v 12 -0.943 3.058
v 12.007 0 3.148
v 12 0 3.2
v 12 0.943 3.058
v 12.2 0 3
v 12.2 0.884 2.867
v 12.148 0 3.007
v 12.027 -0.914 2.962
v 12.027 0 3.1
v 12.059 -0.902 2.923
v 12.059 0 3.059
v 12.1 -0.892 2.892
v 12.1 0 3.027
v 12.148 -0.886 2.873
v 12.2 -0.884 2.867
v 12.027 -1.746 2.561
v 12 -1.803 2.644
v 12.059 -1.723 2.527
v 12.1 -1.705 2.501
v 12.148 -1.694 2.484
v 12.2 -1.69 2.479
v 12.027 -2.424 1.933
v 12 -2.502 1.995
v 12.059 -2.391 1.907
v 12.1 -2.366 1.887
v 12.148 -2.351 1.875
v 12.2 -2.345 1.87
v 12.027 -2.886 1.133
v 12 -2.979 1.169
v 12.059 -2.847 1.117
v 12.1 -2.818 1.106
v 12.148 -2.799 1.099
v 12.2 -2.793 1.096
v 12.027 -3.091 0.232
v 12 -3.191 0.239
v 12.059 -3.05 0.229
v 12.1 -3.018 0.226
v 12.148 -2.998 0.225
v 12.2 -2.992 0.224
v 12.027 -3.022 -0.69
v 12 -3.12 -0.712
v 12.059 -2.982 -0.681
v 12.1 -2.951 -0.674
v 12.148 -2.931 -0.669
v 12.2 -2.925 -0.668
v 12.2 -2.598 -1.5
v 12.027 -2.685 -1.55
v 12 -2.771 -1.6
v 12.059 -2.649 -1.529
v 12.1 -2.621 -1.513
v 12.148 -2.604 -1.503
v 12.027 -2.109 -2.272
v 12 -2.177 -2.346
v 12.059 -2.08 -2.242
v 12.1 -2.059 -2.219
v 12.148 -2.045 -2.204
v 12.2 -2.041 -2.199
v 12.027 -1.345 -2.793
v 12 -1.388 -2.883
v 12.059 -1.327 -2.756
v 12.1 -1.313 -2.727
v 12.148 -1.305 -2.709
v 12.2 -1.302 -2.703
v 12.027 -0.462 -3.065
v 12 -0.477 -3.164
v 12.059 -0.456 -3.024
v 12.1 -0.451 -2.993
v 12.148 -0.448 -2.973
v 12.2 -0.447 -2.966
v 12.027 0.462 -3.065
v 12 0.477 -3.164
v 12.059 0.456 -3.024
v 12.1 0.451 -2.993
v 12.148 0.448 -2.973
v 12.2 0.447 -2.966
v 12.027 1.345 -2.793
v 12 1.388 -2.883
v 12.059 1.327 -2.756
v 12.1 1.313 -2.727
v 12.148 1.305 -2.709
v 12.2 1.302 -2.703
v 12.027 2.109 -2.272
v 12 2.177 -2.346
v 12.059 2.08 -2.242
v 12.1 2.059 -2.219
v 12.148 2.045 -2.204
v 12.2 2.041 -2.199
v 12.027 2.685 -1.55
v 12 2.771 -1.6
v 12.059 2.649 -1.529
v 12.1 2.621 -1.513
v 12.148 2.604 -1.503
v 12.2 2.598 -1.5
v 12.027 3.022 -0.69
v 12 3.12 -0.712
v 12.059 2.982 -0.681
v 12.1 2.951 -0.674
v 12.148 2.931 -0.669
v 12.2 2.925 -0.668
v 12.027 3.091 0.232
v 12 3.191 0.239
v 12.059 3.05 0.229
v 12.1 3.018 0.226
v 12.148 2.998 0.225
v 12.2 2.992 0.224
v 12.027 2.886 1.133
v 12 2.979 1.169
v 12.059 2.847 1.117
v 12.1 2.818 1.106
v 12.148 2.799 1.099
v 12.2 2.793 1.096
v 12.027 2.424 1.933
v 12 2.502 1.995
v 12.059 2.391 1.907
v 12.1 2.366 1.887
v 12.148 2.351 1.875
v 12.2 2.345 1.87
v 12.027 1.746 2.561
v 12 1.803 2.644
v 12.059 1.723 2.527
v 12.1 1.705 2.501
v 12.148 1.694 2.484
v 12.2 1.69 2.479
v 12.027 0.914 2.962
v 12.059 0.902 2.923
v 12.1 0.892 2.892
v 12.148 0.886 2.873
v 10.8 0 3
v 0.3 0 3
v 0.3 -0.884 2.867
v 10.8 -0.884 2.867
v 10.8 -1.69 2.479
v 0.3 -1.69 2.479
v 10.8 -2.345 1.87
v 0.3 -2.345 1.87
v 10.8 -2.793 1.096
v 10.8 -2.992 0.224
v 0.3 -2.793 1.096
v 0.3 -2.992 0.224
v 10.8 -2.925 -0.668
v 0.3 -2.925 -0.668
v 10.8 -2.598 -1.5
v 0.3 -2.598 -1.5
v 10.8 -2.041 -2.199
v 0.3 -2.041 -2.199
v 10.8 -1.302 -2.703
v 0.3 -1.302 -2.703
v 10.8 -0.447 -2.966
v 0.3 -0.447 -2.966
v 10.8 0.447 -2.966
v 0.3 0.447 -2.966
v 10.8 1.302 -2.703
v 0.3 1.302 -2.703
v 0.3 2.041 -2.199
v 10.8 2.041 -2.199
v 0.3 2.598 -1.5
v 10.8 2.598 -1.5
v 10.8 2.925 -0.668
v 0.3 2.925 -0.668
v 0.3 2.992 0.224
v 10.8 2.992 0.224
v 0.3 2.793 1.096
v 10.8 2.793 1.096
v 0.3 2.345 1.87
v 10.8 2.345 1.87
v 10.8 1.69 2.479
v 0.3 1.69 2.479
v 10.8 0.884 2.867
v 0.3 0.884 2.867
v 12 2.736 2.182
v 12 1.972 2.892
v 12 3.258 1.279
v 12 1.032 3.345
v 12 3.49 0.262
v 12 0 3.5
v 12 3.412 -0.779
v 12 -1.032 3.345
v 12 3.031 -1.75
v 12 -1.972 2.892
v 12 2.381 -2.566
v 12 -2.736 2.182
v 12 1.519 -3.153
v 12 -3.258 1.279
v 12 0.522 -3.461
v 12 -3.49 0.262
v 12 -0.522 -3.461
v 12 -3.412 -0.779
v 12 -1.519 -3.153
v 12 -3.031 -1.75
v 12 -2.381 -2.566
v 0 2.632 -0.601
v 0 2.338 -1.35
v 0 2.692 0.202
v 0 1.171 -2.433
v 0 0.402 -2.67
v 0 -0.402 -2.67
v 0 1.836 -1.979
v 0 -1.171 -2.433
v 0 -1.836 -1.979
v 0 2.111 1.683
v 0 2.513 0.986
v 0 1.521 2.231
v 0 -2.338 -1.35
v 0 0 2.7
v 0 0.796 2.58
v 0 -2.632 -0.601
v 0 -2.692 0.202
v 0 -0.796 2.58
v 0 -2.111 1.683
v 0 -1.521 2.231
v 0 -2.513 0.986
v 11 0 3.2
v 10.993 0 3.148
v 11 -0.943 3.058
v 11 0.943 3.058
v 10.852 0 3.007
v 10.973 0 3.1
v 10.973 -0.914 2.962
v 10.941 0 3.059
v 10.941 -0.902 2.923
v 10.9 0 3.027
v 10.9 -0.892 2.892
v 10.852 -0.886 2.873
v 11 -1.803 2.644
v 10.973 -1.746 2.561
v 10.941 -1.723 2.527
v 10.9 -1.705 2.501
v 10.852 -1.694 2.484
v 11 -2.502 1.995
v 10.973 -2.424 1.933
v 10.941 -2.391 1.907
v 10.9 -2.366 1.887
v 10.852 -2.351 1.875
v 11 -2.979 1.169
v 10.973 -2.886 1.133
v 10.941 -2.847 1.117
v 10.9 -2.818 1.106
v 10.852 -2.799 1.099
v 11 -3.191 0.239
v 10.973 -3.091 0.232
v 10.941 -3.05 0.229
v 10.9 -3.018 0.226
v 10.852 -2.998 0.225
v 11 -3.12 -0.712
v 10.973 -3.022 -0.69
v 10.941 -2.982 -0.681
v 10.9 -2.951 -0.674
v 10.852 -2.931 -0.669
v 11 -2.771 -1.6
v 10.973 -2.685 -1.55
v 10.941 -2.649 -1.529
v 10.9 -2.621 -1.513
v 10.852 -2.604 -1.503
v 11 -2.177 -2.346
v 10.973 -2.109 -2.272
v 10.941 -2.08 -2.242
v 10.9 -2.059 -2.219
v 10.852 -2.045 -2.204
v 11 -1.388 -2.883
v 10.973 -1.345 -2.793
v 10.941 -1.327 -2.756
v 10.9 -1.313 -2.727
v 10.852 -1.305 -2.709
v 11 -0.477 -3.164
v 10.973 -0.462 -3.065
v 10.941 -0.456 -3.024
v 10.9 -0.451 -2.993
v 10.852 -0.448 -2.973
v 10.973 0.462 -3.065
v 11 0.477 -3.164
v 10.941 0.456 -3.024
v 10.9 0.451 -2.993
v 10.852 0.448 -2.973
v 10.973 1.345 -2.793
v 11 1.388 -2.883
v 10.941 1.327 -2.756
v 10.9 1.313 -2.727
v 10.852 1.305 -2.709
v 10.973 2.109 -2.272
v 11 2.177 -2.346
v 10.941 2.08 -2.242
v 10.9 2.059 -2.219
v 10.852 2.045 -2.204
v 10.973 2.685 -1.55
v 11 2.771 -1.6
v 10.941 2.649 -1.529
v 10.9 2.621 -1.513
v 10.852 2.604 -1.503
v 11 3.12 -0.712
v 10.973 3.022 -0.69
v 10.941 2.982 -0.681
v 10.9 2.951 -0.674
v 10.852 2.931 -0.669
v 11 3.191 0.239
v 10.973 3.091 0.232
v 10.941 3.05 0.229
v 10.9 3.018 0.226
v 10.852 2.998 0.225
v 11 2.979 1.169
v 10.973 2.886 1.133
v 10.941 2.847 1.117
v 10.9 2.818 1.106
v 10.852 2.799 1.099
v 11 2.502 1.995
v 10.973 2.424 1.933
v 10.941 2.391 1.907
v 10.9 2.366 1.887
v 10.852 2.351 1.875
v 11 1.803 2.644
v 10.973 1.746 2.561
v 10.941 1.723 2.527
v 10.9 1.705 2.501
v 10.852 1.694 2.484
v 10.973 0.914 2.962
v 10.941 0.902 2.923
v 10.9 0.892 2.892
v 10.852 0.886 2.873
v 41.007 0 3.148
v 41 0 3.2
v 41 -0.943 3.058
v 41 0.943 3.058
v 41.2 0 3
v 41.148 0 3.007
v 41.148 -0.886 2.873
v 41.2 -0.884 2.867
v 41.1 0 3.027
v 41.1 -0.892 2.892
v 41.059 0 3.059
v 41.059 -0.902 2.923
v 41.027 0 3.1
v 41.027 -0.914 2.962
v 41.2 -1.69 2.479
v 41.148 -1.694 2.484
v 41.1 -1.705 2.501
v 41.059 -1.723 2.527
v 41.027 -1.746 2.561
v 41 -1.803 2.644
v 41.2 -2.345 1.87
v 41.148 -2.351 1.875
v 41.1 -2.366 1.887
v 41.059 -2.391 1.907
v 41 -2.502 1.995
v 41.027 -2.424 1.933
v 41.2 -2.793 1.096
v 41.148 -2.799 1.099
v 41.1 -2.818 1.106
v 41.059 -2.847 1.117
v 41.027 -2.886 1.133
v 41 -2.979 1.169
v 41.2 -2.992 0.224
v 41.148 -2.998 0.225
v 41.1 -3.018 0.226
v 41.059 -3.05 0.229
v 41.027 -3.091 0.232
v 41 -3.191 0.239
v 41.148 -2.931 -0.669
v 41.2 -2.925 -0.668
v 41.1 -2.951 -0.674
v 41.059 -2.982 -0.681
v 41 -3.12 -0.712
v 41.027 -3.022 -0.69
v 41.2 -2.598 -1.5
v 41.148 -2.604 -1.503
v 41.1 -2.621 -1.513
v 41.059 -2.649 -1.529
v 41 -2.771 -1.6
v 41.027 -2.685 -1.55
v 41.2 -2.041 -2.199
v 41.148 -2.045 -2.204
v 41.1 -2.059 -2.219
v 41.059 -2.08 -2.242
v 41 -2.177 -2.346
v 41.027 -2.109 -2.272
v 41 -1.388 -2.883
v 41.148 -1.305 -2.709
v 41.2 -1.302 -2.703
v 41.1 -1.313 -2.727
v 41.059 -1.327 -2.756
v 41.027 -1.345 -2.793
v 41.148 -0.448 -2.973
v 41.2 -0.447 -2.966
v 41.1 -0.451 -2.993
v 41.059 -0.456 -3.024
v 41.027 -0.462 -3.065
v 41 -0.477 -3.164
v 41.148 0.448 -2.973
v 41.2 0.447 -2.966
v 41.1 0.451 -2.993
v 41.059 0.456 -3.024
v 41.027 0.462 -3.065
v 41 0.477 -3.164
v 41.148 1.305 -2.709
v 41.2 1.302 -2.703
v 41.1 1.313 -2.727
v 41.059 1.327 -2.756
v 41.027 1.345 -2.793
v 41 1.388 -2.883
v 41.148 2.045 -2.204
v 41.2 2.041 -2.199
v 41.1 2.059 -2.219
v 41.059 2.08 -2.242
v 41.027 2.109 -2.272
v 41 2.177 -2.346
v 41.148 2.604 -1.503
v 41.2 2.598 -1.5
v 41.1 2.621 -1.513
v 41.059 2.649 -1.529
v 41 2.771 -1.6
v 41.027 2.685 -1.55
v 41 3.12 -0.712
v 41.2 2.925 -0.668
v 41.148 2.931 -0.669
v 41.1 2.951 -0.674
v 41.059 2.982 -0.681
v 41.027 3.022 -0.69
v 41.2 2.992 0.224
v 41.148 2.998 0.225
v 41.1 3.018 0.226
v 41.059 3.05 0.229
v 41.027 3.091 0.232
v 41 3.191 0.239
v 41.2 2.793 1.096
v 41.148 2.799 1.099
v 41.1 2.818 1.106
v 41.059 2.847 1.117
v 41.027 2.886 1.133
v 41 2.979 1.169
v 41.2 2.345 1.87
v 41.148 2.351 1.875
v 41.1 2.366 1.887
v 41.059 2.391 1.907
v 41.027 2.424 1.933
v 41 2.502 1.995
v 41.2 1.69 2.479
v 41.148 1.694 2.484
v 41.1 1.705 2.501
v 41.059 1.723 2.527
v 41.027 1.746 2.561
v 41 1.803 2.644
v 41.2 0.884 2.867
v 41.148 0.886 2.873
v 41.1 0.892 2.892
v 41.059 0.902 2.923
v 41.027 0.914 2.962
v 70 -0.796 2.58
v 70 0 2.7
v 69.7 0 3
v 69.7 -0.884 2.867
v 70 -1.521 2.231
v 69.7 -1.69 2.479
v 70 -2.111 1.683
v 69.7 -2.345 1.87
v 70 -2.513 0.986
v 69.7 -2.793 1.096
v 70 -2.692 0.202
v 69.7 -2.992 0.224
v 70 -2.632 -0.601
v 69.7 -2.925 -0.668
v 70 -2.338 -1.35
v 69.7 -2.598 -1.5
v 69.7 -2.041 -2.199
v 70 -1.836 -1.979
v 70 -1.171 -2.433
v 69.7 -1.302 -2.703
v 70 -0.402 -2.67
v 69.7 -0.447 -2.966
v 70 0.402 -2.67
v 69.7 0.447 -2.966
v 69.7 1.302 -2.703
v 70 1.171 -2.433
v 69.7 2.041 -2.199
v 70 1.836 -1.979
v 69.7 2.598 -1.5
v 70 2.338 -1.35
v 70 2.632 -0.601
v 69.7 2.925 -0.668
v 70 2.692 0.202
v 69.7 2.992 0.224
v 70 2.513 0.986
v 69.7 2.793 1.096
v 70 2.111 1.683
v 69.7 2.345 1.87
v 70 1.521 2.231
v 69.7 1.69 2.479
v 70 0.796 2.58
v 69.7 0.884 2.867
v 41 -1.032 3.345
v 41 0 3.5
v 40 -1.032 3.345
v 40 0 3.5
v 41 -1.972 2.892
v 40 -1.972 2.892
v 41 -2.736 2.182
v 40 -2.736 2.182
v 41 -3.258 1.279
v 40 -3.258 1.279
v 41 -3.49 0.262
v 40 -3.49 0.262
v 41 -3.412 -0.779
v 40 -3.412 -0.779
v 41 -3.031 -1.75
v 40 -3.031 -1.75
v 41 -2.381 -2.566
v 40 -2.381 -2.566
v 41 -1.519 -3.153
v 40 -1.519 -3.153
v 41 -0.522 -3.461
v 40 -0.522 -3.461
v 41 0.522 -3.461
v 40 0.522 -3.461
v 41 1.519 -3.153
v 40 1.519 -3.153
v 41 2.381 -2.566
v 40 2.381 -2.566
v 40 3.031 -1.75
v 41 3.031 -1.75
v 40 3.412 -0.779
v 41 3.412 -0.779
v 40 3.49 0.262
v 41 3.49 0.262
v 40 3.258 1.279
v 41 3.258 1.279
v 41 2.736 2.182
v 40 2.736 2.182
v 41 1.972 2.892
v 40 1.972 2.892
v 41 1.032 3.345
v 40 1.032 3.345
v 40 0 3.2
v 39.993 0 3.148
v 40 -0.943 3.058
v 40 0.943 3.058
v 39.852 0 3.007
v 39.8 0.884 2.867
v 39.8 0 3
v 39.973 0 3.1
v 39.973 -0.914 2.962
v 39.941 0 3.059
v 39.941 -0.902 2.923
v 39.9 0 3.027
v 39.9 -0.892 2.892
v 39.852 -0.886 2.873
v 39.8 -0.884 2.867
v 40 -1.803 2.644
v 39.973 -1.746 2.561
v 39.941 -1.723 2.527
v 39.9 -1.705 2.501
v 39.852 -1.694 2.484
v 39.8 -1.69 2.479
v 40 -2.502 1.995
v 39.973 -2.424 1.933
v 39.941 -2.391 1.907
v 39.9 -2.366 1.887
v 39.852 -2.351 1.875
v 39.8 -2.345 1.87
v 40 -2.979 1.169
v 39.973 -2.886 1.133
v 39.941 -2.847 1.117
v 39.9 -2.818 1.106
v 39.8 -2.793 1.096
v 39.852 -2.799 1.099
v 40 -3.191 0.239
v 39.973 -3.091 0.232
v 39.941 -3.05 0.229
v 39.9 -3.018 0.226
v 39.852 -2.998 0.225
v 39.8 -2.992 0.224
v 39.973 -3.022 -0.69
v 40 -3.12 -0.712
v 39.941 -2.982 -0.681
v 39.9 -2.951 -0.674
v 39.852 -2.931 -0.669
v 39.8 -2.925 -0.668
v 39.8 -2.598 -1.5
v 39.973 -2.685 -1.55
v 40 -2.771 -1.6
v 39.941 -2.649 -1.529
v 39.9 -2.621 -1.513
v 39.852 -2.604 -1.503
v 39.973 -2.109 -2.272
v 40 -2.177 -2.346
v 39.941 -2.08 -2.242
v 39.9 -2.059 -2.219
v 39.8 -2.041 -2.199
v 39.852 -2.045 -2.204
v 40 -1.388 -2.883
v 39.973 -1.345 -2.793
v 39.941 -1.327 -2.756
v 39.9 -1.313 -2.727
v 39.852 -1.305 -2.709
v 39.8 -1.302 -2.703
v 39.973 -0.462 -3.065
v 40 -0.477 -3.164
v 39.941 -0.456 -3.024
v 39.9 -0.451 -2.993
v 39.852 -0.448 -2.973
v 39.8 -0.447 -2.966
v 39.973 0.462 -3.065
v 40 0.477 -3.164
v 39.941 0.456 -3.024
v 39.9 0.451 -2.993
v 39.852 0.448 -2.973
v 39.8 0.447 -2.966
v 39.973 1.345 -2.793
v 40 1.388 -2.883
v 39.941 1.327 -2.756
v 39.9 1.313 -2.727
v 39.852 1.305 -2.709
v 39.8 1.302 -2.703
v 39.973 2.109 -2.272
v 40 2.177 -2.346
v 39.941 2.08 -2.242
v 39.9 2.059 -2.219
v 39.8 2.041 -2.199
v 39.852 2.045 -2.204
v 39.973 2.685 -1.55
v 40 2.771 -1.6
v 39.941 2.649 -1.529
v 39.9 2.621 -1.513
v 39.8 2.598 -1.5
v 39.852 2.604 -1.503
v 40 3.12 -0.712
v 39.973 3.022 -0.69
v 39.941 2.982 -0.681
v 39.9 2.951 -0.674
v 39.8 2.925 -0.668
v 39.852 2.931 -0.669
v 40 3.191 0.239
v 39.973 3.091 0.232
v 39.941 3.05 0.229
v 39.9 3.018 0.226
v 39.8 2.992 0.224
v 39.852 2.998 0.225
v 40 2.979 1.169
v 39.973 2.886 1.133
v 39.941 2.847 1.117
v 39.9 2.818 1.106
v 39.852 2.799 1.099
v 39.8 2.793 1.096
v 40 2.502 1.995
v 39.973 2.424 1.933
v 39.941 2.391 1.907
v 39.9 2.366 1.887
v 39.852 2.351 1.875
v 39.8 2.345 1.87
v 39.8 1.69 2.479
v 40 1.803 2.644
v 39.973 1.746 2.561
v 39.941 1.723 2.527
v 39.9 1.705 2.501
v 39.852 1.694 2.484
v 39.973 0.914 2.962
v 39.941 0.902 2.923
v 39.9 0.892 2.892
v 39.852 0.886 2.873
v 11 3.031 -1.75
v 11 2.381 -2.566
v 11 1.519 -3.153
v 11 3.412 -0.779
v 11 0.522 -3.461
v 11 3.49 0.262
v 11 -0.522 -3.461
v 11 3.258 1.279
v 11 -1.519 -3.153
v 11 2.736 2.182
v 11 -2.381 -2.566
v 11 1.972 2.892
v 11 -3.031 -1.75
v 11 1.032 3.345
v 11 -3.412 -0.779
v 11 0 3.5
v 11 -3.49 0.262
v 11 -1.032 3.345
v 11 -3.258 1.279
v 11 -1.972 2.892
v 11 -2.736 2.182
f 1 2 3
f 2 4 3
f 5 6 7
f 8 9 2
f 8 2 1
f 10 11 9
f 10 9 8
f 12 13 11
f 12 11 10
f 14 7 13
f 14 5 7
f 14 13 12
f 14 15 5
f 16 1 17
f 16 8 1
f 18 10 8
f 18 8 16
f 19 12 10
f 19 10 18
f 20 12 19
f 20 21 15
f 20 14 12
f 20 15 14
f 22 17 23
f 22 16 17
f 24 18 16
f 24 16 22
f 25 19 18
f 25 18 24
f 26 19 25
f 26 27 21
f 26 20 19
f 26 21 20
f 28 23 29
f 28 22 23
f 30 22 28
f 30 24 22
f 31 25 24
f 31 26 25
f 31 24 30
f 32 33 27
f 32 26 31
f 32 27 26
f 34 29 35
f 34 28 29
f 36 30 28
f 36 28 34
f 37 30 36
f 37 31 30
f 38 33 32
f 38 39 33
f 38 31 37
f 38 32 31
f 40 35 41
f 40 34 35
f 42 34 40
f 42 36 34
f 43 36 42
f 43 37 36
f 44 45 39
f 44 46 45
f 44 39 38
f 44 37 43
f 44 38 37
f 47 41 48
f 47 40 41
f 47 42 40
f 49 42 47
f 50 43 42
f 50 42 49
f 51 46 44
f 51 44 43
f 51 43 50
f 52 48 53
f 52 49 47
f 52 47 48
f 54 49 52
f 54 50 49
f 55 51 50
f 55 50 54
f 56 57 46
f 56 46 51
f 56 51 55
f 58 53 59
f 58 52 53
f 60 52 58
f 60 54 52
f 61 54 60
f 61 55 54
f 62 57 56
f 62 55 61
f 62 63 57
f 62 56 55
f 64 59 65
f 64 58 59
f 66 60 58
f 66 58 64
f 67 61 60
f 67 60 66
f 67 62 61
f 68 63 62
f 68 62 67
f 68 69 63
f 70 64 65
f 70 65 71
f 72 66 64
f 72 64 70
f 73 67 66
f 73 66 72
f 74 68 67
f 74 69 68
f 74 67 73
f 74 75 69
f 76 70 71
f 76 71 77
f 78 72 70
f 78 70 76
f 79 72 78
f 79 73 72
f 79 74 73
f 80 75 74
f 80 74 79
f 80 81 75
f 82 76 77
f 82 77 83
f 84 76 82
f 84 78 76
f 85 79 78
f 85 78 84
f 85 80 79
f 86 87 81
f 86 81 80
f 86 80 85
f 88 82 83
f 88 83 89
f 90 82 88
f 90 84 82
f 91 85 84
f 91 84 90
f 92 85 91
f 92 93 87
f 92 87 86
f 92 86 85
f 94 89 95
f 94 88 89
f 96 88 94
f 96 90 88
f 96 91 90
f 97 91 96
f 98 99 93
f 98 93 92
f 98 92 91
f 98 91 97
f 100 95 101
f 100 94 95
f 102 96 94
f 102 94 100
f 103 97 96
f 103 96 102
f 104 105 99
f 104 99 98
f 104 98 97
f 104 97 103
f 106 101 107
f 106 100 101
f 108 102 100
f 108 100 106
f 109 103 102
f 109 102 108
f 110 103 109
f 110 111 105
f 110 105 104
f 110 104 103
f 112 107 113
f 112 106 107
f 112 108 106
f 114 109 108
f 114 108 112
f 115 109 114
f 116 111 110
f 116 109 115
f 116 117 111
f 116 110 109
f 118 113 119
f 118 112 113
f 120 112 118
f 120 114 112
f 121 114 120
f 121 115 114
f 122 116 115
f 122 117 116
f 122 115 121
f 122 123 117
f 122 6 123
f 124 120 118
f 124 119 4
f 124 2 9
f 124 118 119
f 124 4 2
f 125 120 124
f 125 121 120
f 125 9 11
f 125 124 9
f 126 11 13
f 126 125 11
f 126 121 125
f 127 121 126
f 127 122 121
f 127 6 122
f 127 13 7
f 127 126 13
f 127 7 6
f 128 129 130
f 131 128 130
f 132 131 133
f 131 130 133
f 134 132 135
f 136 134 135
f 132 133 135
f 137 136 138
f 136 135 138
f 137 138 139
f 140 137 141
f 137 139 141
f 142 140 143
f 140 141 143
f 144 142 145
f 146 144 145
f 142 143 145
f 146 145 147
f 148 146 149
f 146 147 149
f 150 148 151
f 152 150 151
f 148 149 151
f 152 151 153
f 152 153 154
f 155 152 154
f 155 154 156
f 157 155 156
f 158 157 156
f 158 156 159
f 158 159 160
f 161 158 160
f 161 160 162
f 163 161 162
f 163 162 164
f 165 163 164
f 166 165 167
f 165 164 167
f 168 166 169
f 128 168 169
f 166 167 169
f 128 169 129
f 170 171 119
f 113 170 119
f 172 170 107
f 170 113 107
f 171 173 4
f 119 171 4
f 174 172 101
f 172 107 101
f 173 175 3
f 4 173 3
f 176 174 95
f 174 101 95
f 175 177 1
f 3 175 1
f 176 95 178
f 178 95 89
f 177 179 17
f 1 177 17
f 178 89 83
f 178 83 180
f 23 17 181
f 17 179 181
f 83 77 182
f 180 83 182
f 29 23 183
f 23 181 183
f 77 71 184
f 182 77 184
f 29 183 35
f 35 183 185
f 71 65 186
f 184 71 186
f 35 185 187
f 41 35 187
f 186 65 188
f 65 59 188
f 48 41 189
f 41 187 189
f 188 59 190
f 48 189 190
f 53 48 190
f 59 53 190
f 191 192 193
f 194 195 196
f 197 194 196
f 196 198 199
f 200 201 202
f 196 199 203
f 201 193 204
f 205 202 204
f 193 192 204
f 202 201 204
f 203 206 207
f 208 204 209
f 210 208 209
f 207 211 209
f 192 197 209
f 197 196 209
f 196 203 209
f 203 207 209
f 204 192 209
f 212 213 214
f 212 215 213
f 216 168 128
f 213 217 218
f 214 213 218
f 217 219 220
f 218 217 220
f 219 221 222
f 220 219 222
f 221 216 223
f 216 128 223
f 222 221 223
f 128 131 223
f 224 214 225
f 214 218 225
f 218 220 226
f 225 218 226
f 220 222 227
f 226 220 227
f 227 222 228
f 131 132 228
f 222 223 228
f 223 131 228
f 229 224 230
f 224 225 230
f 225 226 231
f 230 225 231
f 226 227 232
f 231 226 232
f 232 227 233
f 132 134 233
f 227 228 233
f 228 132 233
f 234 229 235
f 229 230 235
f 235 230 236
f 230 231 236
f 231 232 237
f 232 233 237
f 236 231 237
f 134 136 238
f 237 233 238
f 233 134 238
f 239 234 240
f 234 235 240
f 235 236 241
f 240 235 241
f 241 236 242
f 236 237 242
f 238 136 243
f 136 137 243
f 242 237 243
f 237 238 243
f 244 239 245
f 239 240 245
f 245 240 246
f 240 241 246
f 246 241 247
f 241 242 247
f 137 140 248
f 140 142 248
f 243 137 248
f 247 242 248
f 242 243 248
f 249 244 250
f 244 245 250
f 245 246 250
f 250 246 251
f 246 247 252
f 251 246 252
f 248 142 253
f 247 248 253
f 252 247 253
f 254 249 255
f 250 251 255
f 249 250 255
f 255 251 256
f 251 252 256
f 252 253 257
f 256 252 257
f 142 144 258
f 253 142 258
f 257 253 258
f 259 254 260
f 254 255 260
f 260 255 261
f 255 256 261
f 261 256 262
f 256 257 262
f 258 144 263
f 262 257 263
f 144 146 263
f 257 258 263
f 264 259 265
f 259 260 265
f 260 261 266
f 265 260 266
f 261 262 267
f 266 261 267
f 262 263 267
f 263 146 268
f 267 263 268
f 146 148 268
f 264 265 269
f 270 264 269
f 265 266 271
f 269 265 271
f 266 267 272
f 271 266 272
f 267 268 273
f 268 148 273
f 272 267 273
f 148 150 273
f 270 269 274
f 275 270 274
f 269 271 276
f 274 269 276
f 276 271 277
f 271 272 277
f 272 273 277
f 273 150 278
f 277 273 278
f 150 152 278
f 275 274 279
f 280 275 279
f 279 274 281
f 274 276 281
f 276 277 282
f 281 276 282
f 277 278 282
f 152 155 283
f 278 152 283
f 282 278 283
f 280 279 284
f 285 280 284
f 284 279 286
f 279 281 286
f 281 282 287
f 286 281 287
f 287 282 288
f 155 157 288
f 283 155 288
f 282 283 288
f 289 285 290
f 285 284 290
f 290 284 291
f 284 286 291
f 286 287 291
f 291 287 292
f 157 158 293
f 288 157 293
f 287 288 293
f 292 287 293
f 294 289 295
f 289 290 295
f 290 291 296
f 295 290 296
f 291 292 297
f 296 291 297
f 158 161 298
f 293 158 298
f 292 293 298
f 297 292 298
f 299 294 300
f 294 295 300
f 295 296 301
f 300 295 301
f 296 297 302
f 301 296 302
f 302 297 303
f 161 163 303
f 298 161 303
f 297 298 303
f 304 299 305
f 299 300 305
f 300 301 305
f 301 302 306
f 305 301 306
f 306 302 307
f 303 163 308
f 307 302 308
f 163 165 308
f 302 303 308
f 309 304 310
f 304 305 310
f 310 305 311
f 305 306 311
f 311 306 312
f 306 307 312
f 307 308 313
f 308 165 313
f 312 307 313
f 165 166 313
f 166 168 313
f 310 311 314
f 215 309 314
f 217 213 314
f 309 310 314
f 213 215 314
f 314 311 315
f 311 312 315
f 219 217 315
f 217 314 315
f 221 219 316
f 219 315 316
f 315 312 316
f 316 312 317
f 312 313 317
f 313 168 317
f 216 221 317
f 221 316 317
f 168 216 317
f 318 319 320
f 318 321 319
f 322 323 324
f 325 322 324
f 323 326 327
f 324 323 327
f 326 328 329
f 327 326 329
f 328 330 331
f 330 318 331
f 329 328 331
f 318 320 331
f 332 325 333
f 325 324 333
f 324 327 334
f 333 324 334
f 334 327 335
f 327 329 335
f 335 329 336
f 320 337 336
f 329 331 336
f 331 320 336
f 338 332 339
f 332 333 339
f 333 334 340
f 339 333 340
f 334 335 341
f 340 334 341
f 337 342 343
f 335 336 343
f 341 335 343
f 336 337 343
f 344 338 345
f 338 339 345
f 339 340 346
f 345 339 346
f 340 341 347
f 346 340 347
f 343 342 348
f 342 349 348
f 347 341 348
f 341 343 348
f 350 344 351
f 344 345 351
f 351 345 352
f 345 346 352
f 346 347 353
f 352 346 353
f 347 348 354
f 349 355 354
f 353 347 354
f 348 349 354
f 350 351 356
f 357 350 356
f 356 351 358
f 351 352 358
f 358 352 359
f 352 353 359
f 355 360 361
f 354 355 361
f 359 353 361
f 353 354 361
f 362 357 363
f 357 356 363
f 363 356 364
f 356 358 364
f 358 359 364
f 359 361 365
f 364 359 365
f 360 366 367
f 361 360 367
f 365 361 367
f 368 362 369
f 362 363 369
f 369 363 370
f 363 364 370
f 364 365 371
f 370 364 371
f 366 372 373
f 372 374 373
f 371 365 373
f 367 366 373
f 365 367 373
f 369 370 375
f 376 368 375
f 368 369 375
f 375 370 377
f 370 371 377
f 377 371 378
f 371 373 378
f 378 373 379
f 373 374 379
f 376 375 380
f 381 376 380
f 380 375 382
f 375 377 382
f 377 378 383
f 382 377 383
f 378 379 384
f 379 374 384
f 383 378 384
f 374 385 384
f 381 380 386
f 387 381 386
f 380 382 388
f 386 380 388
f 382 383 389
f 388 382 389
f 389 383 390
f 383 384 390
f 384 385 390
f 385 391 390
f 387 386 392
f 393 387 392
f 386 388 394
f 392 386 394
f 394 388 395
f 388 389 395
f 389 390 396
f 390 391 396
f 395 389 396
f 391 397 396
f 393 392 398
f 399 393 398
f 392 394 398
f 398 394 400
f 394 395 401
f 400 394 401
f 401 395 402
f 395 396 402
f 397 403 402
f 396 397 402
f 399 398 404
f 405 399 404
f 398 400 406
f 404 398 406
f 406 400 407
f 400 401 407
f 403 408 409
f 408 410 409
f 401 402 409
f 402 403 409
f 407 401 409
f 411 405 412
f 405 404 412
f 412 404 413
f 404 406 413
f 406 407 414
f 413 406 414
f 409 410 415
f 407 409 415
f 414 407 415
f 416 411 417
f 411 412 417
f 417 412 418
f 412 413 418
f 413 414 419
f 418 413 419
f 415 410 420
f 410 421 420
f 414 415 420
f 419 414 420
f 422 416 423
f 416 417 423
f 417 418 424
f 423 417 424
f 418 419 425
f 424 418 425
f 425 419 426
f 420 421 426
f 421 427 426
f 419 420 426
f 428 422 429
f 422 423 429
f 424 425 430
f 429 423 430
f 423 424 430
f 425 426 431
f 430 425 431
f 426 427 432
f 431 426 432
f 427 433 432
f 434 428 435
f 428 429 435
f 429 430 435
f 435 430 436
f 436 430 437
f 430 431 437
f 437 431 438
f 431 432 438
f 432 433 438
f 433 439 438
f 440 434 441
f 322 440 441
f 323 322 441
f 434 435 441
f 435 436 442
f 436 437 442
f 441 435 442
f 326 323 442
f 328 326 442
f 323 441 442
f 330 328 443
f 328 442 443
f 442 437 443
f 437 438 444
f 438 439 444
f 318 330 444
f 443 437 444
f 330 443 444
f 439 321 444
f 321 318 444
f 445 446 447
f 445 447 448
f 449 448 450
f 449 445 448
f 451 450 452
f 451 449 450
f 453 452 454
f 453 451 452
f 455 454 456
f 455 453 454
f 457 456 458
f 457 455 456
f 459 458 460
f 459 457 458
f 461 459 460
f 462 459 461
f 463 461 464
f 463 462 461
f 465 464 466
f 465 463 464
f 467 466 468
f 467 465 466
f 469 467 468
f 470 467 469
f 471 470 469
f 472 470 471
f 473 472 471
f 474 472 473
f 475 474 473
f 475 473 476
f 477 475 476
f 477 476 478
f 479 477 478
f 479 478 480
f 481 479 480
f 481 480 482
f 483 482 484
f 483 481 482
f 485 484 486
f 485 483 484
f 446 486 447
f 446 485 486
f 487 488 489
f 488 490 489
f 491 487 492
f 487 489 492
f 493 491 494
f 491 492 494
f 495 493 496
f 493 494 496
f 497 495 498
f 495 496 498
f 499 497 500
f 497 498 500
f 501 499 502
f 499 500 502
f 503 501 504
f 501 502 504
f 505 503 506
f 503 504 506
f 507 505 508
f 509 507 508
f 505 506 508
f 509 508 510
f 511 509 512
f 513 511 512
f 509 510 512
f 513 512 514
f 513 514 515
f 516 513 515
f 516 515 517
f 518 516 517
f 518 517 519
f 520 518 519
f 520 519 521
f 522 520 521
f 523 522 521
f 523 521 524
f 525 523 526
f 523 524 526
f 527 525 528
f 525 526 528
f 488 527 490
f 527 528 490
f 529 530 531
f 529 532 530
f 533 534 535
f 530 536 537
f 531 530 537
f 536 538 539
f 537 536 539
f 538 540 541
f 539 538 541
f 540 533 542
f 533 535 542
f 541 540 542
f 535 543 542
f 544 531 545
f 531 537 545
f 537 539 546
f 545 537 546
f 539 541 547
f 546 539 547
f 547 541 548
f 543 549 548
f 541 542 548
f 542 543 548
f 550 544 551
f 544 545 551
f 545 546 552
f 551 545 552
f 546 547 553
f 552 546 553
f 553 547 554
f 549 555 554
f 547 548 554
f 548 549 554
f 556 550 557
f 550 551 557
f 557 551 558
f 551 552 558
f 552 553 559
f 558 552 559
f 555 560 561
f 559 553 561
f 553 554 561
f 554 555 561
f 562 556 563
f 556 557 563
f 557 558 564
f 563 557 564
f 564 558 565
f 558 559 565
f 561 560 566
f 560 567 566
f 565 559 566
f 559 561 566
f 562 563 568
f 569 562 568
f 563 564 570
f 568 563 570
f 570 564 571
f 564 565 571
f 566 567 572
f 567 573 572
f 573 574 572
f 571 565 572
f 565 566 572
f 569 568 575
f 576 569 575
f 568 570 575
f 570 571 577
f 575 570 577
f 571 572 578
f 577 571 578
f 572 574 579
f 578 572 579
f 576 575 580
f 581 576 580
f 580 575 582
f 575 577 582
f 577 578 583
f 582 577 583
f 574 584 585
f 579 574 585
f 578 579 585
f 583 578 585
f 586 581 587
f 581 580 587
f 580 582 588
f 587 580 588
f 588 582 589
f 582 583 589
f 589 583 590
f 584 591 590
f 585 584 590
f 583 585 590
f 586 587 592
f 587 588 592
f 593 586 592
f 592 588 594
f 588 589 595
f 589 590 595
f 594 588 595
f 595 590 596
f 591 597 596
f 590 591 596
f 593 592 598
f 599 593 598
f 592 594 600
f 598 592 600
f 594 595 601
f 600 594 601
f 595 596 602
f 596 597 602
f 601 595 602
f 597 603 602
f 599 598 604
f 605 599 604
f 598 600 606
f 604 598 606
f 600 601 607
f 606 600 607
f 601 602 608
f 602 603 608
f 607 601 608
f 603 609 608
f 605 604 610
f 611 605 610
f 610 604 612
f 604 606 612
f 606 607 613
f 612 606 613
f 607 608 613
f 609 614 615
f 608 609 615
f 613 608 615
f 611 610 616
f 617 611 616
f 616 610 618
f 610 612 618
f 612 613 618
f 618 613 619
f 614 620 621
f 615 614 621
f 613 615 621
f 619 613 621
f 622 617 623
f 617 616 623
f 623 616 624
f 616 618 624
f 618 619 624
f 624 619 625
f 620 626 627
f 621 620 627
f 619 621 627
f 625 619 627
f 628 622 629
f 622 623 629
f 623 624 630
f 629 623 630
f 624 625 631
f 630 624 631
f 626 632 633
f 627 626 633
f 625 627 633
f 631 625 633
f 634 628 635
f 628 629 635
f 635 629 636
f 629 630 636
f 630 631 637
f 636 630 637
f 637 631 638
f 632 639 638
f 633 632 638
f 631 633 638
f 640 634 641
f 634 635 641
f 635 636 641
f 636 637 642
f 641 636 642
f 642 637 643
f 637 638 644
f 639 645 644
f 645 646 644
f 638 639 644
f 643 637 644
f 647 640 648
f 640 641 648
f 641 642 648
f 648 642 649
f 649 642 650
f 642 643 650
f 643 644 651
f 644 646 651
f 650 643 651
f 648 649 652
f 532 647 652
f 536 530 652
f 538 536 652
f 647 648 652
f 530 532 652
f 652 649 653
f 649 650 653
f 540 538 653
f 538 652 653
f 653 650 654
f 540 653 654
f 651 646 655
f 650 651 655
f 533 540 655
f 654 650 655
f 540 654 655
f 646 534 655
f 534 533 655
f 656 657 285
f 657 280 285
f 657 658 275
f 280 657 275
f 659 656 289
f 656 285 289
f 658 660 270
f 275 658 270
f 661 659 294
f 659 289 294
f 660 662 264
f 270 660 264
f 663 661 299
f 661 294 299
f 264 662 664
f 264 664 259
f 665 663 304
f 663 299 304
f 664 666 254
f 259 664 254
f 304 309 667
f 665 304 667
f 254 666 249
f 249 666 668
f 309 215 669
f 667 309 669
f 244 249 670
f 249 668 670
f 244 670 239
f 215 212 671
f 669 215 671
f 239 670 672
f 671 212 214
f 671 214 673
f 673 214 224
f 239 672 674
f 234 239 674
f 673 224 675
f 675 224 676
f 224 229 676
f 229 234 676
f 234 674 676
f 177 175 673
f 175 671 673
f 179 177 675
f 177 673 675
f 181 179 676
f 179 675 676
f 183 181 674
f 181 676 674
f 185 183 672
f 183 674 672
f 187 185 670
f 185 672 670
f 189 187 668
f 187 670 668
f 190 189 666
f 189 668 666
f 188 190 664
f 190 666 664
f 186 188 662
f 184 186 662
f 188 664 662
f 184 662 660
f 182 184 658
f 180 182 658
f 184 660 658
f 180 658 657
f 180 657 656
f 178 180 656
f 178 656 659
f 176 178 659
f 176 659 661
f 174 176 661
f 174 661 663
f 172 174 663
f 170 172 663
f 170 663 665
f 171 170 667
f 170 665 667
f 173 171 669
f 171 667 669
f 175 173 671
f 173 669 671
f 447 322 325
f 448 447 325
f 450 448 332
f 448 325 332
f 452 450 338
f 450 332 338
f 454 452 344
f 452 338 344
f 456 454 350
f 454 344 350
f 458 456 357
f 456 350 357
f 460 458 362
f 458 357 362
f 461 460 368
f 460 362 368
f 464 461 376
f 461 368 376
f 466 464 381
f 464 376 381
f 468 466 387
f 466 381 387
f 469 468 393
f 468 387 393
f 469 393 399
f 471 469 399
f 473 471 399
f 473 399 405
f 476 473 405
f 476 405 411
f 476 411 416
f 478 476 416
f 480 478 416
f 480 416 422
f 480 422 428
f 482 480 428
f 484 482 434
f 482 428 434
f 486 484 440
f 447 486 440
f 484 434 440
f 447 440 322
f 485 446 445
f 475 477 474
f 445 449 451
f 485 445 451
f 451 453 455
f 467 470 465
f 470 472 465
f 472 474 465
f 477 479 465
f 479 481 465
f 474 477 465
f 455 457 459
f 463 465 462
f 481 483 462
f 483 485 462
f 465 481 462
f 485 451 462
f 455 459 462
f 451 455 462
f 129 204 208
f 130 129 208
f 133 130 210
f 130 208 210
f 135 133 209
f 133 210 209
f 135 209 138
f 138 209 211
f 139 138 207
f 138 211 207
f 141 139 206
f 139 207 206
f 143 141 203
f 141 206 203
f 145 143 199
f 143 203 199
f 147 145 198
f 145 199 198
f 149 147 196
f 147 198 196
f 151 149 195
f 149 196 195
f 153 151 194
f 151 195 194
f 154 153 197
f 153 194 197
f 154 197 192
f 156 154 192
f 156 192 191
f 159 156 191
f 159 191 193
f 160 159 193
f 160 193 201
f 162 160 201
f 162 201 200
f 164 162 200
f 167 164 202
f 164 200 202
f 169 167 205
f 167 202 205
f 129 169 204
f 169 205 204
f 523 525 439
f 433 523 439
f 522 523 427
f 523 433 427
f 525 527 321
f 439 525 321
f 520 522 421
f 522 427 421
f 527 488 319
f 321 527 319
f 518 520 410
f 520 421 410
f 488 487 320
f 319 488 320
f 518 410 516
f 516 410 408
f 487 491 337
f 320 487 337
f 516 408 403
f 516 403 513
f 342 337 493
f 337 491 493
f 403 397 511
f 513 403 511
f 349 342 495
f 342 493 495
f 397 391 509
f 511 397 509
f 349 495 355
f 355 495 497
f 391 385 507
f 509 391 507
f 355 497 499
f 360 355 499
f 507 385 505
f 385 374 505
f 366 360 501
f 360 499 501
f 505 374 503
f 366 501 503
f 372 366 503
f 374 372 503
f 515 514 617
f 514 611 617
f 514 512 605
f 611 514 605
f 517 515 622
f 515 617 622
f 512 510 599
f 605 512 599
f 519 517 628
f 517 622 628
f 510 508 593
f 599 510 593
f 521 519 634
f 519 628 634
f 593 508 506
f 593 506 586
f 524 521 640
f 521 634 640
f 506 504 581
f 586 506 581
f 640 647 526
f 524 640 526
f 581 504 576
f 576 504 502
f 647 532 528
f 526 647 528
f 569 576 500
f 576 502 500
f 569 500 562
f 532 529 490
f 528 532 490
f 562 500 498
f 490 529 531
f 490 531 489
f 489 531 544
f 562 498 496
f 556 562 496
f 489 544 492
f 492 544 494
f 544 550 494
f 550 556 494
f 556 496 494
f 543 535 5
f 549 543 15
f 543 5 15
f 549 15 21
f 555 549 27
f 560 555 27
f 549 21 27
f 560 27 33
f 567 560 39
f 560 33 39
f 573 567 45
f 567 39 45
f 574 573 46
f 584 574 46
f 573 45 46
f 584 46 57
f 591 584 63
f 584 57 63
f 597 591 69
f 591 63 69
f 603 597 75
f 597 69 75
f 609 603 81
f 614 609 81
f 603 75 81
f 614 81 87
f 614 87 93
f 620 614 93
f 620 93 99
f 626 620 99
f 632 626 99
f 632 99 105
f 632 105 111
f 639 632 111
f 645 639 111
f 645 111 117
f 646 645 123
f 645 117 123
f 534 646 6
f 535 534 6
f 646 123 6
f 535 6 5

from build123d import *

# Parameters (mm, degrees)
SKETCH1_W     = 18
SKETCH1_H     = 3
SKETCH1_W_2   = 2
SKETCH1_W_3   = 10
SKETCH1_W_4   = 12
FILLET1_R     = 0.2
CHAMFER1_SIZE = 0.3


with BuildPart() as part:
    # Sketch1 → Revolve1 (revolve)
    with BuildSketch(Plane.XY, mode=Mode.PRIVATE) as revolve1_sk:
        Polygon((20, 3), (12, 3), (12, 3.5), (11, 3.5), (11, 3), (0, 3), (0, 0), (20, 0), align=None)
        with Locations((29, 1.5)):
            Rectangle(SKETCH1_W, SKETCH1_H)
        with Locations((39, 1.5)):
            Rectangle(SKETCH1_W_2, SKETCH1_H)
        Polygon((40, 3.5), (40, 3), (40, 0), (48, 0), (48, 3), (41, 3), (41, 3.5), align=None)
        with Locations((53, 1.5)):
            Rectangle(SKETCH1_W_3, SKETCH1_H)
        with Locations((64, 1.5)):
            Rectangle(SKETCH1_W_4, SKETCH1_H)
    revolve(revolve1_sk.sketch.rotate(Axis((0, 0, 0), (1, 0, 0)), 90), axis=Axis((0, 0, 0), (1, 0, 0)))

    # Fillet1
    fillet1_edges = [part.edges().sort_by_distance(p)[0] for p in [
        (11, 0, -3),
        (12, 0, -3),
        (40, 0, -3),
        (41, 0, -3),
    ]]
    fillet(fillet1_edges, radius=FILLET1_R)

    # Chamfer1
    chamfer1_edges = [part.edges().sort_by_distance(p)[0] for p in [
        (0, 0, -3),
        (70, 0, -3),
    ]]
    chamfer(chamfer1_edges, length=CHAMFER1_SIZE)


solid = part.part
